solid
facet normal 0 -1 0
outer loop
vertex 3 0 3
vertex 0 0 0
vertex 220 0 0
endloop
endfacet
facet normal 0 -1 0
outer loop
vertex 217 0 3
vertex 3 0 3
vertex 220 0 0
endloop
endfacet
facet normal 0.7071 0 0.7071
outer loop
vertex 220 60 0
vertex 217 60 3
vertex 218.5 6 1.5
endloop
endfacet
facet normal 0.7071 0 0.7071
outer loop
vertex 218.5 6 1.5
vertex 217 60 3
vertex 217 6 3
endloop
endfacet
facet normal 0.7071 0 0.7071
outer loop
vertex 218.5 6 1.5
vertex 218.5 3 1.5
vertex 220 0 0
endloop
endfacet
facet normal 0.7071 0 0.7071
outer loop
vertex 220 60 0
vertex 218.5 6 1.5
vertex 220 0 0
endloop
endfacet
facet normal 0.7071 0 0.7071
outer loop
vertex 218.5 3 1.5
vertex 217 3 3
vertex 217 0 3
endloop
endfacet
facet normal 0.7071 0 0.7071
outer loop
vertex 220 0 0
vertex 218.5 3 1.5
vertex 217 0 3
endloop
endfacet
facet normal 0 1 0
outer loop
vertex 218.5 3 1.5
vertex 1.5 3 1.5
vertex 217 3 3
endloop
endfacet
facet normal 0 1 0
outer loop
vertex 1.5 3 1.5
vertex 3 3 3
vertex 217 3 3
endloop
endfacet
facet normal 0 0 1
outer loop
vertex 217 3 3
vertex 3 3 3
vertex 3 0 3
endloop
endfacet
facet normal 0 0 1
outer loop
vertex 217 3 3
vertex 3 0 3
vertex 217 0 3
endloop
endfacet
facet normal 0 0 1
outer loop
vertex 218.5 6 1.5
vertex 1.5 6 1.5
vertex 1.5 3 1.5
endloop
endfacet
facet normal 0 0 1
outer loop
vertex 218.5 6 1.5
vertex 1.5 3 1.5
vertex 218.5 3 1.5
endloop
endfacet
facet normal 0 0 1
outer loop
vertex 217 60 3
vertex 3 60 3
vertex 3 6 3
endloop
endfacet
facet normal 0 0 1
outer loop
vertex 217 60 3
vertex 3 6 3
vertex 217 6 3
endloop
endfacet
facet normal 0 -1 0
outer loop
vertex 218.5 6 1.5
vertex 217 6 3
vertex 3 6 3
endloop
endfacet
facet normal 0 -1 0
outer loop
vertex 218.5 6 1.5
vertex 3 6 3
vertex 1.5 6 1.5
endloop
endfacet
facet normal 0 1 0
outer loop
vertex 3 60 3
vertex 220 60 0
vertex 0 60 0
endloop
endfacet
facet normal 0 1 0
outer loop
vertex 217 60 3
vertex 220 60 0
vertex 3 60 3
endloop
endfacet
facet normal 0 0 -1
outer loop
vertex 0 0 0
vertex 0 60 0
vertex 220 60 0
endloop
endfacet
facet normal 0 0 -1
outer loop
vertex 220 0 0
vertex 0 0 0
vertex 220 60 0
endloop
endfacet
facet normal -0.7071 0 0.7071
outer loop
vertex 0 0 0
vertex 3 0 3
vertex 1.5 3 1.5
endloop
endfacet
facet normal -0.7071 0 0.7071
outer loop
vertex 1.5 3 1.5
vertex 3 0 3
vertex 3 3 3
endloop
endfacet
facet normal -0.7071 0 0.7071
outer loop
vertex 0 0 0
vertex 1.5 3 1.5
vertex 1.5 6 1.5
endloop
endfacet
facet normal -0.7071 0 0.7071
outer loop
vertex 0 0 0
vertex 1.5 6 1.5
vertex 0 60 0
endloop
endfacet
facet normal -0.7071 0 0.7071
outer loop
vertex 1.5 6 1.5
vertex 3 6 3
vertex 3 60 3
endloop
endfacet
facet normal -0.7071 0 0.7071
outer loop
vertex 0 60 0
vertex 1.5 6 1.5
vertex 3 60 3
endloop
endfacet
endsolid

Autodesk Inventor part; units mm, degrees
ref_plane "YZ Plane" through (0, 0, 0) normal (1, 0, 0) x (0, 1, 0)
ref_plane "XZ Plane" through (0, 0, 0) normal (0, 1, 0) x (-1, 0, 0)
ref_plane "XY Plane" through (0, 0, 0) normal (0, 0, 1) x (1, 0, 0)
sketch "Sketch1" plane through (0, 0, 0) normal (0, 0, 1) x (1, 0, 0)
  line L0 (0, 0) -> (220, 0)
  line L1 (220, 0) -> (220, 60)
  line L2 (220, 60) -> (0, 60)
  line L3 (0, 60) -> (0, 0)
  dimension "d0" = 220
  dimension "d1" = 60
extrude "Extrusion1" add sketch "Sketch1" along normal blind 3
sketch "Sketch2" plane through (0, 0, 3) normal (0, 0, 1) x (1, 0, 0)
  line L0 (0, 60) -> (0, 0) projected
  line L1 (0, 0) -> (0, 3)
  line L2 (0, 0) -> (3, 0) construction
  line L3 (0, 3) -> (220, 3)
  line L4 (220, 3) -> (220, 6)
  line L5 (220, 6) -> (0, 6)
  line L6 (0, 6) -> (0, 3)
  dimension "d4" = 3
  dimension "d5" = 90
  dimension "d6" = 220
  dimension "d7" = 3
extrude "Extrusion2" cut sketch "Sketch2" against normal blind 1.5
chamfer "Chamfer1" distance 3 angle 45 1 edges at (0, 33, 3)
chamfer "Chamfer2" distance 3 angle 45 1 edges at (220, 33, 3)
properties part number "Inert sider"
